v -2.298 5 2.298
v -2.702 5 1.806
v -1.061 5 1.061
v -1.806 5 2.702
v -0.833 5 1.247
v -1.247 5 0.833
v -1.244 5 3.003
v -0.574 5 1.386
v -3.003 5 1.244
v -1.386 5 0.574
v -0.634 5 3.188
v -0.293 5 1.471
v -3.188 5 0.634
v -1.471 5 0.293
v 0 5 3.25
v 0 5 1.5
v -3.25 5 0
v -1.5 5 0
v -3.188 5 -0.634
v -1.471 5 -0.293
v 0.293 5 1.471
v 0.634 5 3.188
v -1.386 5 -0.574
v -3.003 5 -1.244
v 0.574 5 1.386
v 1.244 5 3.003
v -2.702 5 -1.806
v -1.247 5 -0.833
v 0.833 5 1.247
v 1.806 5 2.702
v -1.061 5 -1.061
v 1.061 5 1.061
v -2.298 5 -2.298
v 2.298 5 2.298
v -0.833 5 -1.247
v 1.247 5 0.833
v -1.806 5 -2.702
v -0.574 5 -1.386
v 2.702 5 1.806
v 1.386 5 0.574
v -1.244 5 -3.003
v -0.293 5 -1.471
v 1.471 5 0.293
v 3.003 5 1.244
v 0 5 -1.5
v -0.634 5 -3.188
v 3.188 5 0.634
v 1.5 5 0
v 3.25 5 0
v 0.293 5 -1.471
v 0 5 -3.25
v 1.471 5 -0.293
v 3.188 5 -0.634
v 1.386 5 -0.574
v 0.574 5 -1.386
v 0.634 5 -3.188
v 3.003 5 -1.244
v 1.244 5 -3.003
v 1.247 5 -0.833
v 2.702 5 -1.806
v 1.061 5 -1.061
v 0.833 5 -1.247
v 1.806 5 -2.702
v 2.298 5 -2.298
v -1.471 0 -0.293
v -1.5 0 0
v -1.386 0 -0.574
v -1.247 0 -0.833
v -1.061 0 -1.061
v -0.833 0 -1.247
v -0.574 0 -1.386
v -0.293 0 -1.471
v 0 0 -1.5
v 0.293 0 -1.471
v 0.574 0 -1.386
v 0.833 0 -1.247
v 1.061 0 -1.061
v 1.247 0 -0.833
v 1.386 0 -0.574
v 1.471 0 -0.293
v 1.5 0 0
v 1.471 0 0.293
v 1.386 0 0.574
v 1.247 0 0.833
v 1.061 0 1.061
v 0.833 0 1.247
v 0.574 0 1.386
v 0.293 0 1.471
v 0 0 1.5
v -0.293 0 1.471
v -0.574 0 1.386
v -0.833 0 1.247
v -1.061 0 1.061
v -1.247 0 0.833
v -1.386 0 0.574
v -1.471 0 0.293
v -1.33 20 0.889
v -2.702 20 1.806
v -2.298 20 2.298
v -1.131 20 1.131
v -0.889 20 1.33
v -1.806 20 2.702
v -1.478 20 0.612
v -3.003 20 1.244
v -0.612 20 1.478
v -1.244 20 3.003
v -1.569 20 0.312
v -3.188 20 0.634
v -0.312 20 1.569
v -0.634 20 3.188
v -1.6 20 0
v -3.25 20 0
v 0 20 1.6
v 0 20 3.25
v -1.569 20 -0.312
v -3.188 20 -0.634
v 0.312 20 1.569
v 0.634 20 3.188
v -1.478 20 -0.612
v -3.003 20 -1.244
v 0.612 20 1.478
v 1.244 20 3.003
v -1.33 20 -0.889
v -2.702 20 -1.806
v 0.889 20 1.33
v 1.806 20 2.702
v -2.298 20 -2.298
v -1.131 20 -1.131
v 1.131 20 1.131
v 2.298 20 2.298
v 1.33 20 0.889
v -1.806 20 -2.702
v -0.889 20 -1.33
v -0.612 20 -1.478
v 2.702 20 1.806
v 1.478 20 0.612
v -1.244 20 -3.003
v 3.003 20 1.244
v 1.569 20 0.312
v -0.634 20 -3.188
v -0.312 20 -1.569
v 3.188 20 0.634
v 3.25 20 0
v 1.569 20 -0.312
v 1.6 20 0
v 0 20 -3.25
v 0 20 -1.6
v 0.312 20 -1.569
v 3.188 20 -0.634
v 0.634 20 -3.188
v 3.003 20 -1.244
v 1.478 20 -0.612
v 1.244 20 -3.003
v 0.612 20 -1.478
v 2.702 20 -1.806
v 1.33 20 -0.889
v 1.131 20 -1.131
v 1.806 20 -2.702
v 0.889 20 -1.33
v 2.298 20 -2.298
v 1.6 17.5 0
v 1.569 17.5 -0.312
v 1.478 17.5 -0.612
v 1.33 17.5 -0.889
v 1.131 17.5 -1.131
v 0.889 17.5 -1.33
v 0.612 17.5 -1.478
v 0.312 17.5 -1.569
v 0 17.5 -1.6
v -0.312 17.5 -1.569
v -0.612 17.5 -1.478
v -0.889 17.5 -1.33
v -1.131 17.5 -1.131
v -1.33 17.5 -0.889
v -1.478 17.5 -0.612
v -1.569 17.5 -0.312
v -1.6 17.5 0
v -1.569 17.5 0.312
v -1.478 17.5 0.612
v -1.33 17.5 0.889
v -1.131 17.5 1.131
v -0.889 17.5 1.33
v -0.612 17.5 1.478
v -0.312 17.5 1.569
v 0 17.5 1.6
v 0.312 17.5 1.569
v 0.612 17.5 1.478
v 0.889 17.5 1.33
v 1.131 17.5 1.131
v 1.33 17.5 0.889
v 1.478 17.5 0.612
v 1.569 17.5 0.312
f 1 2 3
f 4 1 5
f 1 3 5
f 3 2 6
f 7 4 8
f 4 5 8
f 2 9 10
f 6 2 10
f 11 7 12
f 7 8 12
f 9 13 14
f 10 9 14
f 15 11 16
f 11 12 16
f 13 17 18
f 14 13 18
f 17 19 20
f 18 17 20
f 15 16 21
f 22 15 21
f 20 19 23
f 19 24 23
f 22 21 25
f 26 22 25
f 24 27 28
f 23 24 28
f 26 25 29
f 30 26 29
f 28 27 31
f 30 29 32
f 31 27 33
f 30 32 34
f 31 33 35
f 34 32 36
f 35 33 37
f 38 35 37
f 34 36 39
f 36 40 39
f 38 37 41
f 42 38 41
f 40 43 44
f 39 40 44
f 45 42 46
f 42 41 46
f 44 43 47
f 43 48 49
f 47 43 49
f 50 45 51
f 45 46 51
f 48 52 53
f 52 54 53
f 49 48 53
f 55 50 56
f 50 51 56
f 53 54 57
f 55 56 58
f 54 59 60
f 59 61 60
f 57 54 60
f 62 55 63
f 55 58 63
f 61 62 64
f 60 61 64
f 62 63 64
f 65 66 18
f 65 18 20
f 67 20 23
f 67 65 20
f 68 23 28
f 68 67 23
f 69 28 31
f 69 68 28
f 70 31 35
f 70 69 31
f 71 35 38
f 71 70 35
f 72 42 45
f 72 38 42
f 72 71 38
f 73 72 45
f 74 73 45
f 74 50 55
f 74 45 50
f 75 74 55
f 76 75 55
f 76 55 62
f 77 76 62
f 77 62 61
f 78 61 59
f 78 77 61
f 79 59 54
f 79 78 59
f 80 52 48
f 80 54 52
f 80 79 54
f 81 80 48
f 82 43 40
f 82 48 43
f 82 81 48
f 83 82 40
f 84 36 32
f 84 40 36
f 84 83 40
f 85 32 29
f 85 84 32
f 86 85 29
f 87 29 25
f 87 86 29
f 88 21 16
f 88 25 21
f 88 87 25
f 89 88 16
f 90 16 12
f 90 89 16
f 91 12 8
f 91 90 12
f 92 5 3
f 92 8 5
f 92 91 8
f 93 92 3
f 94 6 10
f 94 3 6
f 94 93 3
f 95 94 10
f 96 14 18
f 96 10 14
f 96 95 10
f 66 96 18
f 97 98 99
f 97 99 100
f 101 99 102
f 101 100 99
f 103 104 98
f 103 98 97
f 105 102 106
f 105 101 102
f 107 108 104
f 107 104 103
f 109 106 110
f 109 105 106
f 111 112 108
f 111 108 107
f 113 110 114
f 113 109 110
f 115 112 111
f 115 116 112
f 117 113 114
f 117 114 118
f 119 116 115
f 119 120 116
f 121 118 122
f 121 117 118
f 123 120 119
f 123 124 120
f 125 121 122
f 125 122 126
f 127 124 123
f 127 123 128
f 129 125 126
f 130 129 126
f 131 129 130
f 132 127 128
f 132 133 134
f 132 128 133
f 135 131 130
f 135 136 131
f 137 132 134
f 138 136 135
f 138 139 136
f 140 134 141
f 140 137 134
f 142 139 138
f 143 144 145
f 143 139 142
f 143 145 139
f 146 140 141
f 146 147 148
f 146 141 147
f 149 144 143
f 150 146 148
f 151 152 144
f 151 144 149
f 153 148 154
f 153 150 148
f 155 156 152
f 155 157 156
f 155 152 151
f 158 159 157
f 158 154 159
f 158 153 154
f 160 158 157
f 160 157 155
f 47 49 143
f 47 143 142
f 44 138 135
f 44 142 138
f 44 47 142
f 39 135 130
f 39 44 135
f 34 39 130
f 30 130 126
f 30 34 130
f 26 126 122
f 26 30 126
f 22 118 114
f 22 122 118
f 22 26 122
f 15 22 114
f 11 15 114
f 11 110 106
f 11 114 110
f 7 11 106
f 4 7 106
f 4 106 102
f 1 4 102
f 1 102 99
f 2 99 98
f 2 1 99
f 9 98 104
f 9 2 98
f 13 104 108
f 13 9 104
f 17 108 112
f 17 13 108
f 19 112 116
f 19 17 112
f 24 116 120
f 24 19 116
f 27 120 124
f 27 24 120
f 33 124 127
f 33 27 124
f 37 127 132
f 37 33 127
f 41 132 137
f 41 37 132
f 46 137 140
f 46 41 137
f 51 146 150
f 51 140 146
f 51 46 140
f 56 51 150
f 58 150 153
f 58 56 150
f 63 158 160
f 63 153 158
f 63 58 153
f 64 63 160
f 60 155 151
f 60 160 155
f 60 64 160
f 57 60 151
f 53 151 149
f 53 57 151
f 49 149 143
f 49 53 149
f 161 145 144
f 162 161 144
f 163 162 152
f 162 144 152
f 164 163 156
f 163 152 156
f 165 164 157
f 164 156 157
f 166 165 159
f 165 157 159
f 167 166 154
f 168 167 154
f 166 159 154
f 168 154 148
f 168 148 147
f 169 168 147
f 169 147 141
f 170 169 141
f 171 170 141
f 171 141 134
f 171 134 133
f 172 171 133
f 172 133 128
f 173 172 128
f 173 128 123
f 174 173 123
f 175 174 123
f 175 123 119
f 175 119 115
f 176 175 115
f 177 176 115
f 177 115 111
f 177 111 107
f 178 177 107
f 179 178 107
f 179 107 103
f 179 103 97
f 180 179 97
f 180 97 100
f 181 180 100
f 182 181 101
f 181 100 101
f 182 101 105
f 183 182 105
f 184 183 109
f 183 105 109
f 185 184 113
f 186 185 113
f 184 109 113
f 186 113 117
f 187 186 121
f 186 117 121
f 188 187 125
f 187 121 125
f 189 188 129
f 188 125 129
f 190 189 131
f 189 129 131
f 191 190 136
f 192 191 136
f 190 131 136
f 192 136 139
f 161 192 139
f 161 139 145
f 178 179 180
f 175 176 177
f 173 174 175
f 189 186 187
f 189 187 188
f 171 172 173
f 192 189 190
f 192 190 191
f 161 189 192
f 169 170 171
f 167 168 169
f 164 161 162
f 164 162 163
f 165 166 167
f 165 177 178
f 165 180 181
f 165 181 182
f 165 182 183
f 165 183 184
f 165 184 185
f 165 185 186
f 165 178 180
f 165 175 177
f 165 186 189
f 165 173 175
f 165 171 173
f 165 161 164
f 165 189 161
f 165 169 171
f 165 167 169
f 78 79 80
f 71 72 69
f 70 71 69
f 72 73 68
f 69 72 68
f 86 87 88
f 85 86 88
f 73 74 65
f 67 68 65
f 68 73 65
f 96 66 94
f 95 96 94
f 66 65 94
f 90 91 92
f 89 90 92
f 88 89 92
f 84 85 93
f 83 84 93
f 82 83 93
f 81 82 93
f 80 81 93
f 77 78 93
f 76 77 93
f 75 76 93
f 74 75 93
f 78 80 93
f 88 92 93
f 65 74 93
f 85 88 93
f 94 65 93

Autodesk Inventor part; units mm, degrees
ref_plane "YZ Plane" through (0, 0, 0) normal (1, 0, 0) x (0, 1, 0)
ref_plane "XZ Plane" through (0, 0, 0) normal (0, 1, 0) x (-1, 0, 0)
ref_plane "XY Plane" through (0, 0, 0) normal (0, 0, 1) x (1, 0, 0)
sketch "Sketch1" plane through (0, 0, 0) normal (0, 1, 0) x (-1, 0, 0)
  circle A0 centre (0, 0) radius 1.5
  dimension "d0" = 3
extrude "Extrusion1" add sketch "Sketch1" along normal blind 5
sketch "Sketch2" plane through (0, 5, 0) normal (0, 1, 0) x (1, 0, 0)
  circle A0 centre (0, 0) radius 1.5 projected
  circle A1 centre (0, 0) radius 3.25
  dimension "d3" = 6.5
extrude "Extrusion2" add sketch "Sketch2" along normal blind 15 contours A0 | A1
sketch "Sketch3" plane through (0, 20, 0) normal (0, 1, 0) x (1, 0, 0)
  circle A0 centre (0, 0) radius 1.5 projected
  circle A1 centre (0, 0) radius 1.6
  dimension "d6" = 3.2
extrude "Extrusion3" cut sketch "Sketch3" against normal blind 2.5 contours A0 | A1
properties part number "ControlPanel_shortStands"
